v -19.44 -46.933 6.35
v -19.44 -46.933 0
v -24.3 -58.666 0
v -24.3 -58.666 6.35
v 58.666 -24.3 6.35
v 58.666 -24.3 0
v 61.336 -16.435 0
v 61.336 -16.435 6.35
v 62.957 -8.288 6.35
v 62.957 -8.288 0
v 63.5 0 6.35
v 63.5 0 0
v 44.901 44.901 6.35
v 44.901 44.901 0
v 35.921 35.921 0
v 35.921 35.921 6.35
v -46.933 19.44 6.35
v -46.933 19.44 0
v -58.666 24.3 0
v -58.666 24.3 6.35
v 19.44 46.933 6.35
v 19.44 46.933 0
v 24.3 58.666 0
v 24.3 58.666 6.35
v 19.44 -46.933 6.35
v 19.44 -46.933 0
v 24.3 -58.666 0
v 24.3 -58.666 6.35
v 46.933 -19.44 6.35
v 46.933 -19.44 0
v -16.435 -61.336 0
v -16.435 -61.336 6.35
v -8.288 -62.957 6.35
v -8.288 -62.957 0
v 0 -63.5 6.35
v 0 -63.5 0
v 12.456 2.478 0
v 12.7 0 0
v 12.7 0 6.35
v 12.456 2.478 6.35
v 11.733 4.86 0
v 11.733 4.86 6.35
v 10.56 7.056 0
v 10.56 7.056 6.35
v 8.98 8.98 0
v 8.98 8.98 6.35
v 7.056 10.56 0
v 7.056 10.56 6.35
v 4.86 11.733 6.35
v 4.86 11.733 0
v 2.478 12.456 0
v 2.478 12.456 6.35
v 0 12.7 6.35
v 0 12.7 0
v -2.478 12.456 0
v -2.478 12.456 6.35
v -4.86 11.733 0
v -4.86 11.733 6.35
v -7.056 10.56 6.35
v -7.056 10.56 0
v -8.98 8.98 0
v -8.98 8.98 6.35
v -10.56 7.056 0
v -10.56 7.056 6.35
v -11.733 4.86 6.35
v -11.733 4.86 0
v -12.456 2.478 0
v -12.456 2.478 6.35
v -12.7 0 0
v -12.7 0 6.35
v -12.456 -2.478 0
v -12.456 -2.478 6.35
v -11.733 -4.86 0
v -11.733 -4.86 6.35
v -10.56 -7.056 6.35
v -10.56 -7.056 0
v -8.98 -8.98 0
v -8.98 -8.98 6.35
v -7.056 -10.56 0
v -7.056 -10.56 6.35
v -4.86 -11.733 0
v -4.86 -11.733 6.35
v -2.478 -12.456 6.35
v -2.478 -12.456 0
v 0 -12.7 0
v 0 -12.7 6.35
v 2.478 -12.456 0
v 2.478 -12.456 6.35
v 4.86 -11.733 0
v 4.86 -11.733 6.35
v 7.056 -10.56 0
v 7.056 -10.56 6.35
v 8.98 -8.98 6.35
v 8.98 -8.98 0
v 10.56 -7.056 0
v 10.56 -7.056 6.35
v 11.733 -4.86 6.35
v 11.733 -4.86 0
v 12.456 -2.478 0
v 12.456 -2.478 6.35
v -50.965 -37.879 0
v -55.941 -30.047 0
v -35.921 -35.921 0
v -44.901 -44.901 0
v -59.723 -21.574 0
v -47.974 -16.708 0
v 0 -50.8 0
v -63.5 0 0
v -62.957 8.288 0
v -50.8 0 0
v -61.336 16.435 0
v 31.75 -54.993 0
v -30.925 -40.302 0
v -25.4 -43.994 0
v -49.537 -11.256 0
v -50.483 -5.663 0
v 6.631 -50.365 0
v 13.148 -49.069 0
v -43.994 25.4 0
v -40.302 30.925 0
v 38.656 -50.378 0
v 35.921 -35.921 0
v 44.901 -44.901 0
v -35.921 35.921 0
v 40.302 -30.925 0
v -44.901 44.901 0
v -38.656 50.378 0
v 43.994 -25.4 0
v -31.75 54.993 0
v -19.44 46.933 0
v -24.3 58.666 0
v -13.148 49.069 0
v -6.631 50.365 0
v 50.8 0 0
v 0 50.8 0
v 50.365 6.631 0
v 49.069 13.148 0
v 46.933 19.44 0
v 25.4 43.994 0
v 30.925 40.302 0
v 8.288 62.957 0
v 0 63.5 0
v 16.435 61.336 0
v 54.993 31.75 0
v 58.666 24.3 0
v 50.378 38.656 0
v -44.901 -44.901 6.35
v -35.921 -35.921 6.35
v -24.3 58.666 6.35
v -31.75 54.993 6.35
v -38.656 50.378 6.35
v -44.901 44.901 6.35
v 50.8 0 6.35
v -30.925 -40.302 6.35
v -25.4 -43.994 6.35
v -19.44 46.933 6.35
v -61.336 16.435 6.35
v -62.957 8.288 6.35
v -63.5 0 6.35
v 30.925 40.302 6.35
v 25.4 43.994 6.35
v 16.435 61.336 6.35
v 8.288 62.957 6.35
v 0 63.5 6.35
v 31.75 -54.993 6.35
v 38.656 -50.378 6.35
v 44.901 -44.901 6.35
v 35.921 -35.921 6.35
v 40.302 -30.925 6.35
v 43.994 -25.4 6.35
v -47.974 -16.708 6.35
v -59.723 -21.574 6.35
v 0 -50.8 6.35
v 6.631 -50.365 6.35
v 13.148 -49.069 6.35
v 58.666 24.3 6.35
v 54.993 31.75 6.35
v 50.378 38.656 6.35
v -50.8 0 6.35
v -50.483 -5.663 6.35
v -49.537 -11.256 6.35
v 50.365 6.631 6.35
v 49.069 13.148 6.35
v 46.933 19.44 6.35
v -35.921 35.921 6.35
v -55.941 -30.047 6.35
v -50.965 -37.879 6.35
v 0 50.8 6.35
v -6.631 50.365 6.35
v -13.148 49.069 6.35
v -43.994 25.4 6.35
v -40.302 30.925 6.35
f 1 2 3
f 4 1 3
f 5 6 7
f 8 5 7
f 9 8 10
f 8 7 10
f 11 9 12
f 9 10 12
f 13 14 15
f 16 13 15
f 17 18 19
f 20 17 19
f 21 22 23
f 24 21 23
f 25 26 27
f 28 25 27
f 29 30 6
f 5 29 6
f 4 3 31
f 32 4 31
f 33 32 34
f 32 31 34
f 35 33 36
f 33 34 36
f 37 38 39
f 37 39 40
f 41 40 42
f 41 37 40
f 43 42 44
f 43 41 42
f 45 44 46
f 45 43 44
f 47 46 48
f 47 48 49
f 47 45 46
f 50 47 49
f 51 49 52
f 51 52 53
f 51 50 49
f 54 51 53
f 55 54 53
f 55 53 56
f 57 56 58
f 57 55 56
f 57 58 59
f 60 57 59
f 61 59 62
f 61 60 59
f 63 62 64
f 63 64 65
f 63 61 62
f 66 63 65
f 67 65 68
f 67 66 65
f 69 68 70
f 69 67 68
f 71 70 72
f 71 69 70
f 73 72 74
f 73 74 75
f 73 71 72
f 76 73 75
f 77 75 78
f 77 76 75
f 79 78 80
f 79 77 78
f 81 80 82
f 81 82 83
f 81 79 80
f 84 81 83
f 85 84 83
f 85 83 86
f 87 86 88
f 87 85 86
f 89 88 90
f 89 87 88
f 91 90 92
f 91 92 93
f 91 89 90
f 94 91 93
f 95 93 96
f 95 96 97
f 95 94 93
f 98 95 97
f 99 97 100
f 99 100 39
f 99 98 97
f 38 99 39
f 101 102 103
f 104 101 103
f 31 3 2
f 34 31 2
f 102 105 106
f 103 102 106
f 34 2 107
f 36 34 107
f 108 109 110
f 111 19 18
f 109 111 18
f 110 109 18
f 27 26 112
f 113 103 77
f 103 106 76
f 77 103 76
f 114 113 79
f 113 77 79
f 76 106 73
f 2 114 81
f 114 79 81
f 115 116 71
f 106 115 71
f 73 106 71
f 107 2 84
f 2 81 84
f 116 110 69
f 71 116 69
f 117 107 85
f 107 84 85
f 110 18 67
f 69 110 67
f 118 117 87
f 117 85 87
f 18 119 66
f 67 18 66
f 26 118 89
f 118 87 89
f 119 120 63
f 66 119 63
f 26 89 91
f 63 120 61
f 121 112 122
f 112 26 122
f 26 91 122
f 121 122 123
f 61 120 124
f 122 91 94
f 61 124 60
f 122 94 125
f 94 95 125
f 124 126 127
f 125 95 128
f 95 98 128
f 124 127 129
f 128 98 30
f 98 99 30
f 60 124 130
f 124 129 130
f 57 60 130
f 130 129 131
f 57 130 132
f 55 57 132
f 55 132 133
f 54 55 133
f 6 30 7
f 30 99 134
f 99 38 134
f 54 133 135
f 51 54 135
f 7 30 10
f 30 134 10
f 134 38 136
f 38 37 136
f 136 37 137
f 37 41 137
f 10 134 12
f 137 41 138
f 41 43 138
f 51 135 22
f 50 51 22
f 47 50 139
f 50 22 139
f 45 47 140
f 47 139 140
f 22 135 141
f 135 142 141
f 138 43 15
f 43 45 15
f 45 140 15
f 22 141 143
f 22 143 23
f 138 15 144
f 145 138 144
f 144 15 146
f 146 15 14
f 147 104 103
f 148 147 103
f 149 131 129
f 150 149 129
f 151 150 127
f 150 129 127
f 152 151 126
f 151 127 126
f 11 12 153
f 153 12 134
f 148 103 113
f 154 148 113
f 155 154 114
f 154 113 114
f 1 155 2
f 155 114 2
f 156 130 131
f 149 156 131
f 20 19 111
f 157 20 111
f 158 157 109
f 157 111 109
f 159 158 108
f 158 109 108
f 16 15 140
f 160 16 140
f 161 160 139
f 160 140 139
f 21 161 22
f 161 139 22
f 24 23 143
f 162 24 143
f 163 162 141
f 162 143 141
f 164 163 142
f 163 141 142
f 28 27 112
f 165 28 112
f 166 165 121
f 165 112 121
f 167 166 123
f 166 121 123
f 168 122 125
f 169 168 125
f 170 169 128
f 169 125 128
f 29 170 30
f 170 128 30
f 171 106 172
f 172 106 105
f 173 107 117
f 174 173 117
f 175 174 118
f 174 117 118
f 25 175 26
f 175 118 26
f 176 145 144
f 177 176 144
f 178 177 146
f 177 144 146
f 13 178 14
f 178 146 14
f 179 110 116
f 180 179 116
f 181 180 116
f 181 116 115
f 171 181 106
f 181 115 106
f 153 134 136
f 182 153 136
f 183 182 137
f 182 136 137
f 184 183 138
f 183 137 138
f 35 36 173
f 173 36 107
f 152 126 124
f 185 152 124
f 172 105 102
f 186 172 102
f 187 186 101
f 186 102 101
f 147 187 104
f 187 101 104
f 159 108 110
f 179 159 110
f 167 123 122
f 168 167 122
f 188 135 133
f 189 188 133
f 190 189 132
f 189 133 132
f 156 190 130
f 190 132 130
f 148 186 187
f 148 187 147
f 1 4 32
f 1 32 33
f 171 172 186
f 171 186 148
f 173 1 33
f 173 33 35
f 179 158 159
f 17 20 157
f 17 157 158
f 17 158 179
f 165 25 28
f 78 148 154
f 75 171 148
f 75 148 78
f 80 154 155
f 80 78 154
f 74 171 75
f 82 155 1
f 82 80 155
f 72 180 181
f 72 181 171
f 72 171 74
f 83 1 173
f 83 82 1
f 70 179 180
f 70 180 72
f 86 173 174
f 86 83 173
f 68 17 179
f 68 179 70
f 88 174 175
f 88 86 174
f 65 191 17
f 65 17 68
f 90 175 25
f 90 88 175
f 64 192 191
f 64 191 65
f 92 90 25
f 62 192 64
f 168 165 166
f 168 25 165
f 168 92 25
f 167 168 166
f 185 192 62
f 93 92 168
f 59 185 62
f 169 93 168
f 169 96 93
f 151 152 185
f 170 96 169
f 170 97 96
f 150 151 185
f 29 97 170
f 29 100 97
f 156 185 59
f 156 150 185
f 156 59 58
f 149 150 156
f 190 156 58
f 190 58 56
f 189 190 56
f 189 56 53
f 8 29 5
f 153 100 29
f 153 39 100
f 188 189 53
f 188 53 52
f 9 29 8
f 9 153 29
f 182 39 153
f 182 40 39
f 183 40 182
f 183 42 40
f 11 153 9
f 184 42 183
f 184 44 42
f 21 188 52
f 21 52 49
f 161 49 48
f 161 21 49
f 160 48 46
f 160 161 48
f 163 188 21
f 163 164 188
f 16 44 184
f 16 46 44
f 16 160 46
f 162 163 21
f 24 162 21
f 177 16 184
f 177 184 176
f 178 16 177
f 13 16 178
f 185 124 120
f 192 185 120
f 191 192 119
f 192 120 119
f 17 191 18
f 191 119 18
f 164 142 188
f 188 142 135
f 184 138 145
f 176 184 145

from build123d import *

# Parameters (mm, degrees)
F0_R     = 12.7
F1_DEPTH = 6.35


with BuildPart() as f1:
    # F0 (on Top) → F1 (new body)
    with BuildSketch(Plane.XY):
        with BuildLine():
            Line((-46.93308, 19.440318), (-58.66635, 24.300398))
            ThreePointArc((-58.66635, 24.300398), (-62.279865, 12.388235), (-63.5, 0))
            Line((-63.5, 0), (-50.8, 0))
            ThreePointArc((-50.8, 0), (-50.08849, -8.472496), (-47.97389, -16.707658))
            Line((-47.97389, -16.707658), (-59.72273, -21.574187))
            ThreePointArc((-59.72273, -21.574187), (-53.596494, -34.053866), (-44.901281, -44.901281))
            Line((-44.901281, -44.901281), (-35.921024, -35.921024))
            ThreePointArc((-35.921024, -35.921024), (-28.222968, -42.238656), (-19.440318, -46.93308))
            Line((-19.440318, -46.93308), (-24.300398, -58.66635))
            ThreePointArc((-24.300398, -58.66635), (-12.388235, -62.279865), (0, -63.5))
            Line((0, -63.5), (0, -50.8))
            ThreePointArc((0, -50.8), (9.910588, -49.823892), (19.440318, -46.93308))
            Line((19.440318, -46.93308), (24.300398, -58.66635))
            ThreePointArc((24.300398, -58.66635), (35.27871, -52.79832), (44.901281, -44.901281))
            Line((44.901281, -44.901281), (35.921024, -35.921024))
            ThreePointArc((35.921024, -35.921024), (42.238656, -28.222968), (46.93308, -19.440318))
            Line((46.93308, -19.440318), (58.66635, -24.300398))
            ThreePointArc((58.66635, -24.300398), (62.279865, -12.388235), (63.5, 0))
            Line((63.5, 0), (50.8, 0))
            ThreePointArc((50.8, 0), (49.823892, 9.910588), (46.93308, 19.440318))
            Line((46.93308, 19.440318), (58.66635, 24.300398))
            ThreePointArc((58.66635, 24.300398), (52.79832, 35.27871), (44.901281, 44.901281))
            Line((44.901281, 44.901281), (35.921024, 35.921024))
            ThreePointArc((35.921024, 35.921024), (28.222968, 42.238656), (19.440318, 46.93308))
            Line((19.440318, 46.93308), (24.300398, 58.66635))
            ThreePointArc((24.300398, 58.66635), (12.388235, 62.279865), (0, 63.5))
            Line((0, 63.5), (0, 50.8))
            ThreePointArc((0, 50.8), (-9.910588, 49.823892), (-19.440318, 46.93308))
            Line((-19.440318, 46.93308), (-24.300398, 58.66635))
            ThreePointArc((-24.300398, 58.66635), (-35.27871, 52.79832), (-44.901281, 44.901281))
            Line((-44.901281, 44.901281), (-35.921024, 35.921024))
            ThreePointArc((-35.921024, 35.921024), (-42.238656, 28.222968), (-46.93308, 19.440318))
        make_face()
        Circle(F0_R, mode=Mode.SUBTRACT)
    extrude(amount=F1_DEPTH)


solid = f1.part
